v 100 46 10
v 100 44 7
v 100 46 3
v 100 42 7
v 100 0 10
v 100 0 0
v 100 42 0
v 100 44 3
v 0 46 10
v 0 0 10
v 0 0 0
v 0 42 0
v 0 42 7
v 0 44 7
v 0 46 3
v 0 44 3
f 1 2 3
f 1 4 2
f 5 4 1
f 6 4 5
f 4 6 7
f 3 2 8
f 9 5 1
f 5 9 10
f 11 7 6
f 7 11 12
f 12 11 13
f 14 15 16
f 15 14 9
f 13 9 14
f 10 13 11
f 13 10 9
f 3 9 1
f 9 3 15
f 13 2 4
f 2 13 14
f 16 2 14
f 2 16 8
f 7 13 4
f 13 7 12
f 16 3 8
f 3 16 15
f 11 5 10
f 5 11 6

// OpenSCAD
WideX=100;
DepthY=40;
HightY=10;
SlotThick=2;
SlotH=8;
Buff=1;
HangAdd=6;
HangCut=4;
DB=Buff*2;

cube([WideX,DepthY,10]);
difference()
{
  translate([0,DepthY,0]) cube([WideX,HangAdd,HightY]);
  translate([-Buff,DepthY+SlotThick,-Buff]) cube([WideX+DB,SlotThick,SlotH]);
  translate([-Buff,DepthY+Buff+SlotThick,-Buff]) cube([WideX+DB,HangAdd,HangCut]);
}
